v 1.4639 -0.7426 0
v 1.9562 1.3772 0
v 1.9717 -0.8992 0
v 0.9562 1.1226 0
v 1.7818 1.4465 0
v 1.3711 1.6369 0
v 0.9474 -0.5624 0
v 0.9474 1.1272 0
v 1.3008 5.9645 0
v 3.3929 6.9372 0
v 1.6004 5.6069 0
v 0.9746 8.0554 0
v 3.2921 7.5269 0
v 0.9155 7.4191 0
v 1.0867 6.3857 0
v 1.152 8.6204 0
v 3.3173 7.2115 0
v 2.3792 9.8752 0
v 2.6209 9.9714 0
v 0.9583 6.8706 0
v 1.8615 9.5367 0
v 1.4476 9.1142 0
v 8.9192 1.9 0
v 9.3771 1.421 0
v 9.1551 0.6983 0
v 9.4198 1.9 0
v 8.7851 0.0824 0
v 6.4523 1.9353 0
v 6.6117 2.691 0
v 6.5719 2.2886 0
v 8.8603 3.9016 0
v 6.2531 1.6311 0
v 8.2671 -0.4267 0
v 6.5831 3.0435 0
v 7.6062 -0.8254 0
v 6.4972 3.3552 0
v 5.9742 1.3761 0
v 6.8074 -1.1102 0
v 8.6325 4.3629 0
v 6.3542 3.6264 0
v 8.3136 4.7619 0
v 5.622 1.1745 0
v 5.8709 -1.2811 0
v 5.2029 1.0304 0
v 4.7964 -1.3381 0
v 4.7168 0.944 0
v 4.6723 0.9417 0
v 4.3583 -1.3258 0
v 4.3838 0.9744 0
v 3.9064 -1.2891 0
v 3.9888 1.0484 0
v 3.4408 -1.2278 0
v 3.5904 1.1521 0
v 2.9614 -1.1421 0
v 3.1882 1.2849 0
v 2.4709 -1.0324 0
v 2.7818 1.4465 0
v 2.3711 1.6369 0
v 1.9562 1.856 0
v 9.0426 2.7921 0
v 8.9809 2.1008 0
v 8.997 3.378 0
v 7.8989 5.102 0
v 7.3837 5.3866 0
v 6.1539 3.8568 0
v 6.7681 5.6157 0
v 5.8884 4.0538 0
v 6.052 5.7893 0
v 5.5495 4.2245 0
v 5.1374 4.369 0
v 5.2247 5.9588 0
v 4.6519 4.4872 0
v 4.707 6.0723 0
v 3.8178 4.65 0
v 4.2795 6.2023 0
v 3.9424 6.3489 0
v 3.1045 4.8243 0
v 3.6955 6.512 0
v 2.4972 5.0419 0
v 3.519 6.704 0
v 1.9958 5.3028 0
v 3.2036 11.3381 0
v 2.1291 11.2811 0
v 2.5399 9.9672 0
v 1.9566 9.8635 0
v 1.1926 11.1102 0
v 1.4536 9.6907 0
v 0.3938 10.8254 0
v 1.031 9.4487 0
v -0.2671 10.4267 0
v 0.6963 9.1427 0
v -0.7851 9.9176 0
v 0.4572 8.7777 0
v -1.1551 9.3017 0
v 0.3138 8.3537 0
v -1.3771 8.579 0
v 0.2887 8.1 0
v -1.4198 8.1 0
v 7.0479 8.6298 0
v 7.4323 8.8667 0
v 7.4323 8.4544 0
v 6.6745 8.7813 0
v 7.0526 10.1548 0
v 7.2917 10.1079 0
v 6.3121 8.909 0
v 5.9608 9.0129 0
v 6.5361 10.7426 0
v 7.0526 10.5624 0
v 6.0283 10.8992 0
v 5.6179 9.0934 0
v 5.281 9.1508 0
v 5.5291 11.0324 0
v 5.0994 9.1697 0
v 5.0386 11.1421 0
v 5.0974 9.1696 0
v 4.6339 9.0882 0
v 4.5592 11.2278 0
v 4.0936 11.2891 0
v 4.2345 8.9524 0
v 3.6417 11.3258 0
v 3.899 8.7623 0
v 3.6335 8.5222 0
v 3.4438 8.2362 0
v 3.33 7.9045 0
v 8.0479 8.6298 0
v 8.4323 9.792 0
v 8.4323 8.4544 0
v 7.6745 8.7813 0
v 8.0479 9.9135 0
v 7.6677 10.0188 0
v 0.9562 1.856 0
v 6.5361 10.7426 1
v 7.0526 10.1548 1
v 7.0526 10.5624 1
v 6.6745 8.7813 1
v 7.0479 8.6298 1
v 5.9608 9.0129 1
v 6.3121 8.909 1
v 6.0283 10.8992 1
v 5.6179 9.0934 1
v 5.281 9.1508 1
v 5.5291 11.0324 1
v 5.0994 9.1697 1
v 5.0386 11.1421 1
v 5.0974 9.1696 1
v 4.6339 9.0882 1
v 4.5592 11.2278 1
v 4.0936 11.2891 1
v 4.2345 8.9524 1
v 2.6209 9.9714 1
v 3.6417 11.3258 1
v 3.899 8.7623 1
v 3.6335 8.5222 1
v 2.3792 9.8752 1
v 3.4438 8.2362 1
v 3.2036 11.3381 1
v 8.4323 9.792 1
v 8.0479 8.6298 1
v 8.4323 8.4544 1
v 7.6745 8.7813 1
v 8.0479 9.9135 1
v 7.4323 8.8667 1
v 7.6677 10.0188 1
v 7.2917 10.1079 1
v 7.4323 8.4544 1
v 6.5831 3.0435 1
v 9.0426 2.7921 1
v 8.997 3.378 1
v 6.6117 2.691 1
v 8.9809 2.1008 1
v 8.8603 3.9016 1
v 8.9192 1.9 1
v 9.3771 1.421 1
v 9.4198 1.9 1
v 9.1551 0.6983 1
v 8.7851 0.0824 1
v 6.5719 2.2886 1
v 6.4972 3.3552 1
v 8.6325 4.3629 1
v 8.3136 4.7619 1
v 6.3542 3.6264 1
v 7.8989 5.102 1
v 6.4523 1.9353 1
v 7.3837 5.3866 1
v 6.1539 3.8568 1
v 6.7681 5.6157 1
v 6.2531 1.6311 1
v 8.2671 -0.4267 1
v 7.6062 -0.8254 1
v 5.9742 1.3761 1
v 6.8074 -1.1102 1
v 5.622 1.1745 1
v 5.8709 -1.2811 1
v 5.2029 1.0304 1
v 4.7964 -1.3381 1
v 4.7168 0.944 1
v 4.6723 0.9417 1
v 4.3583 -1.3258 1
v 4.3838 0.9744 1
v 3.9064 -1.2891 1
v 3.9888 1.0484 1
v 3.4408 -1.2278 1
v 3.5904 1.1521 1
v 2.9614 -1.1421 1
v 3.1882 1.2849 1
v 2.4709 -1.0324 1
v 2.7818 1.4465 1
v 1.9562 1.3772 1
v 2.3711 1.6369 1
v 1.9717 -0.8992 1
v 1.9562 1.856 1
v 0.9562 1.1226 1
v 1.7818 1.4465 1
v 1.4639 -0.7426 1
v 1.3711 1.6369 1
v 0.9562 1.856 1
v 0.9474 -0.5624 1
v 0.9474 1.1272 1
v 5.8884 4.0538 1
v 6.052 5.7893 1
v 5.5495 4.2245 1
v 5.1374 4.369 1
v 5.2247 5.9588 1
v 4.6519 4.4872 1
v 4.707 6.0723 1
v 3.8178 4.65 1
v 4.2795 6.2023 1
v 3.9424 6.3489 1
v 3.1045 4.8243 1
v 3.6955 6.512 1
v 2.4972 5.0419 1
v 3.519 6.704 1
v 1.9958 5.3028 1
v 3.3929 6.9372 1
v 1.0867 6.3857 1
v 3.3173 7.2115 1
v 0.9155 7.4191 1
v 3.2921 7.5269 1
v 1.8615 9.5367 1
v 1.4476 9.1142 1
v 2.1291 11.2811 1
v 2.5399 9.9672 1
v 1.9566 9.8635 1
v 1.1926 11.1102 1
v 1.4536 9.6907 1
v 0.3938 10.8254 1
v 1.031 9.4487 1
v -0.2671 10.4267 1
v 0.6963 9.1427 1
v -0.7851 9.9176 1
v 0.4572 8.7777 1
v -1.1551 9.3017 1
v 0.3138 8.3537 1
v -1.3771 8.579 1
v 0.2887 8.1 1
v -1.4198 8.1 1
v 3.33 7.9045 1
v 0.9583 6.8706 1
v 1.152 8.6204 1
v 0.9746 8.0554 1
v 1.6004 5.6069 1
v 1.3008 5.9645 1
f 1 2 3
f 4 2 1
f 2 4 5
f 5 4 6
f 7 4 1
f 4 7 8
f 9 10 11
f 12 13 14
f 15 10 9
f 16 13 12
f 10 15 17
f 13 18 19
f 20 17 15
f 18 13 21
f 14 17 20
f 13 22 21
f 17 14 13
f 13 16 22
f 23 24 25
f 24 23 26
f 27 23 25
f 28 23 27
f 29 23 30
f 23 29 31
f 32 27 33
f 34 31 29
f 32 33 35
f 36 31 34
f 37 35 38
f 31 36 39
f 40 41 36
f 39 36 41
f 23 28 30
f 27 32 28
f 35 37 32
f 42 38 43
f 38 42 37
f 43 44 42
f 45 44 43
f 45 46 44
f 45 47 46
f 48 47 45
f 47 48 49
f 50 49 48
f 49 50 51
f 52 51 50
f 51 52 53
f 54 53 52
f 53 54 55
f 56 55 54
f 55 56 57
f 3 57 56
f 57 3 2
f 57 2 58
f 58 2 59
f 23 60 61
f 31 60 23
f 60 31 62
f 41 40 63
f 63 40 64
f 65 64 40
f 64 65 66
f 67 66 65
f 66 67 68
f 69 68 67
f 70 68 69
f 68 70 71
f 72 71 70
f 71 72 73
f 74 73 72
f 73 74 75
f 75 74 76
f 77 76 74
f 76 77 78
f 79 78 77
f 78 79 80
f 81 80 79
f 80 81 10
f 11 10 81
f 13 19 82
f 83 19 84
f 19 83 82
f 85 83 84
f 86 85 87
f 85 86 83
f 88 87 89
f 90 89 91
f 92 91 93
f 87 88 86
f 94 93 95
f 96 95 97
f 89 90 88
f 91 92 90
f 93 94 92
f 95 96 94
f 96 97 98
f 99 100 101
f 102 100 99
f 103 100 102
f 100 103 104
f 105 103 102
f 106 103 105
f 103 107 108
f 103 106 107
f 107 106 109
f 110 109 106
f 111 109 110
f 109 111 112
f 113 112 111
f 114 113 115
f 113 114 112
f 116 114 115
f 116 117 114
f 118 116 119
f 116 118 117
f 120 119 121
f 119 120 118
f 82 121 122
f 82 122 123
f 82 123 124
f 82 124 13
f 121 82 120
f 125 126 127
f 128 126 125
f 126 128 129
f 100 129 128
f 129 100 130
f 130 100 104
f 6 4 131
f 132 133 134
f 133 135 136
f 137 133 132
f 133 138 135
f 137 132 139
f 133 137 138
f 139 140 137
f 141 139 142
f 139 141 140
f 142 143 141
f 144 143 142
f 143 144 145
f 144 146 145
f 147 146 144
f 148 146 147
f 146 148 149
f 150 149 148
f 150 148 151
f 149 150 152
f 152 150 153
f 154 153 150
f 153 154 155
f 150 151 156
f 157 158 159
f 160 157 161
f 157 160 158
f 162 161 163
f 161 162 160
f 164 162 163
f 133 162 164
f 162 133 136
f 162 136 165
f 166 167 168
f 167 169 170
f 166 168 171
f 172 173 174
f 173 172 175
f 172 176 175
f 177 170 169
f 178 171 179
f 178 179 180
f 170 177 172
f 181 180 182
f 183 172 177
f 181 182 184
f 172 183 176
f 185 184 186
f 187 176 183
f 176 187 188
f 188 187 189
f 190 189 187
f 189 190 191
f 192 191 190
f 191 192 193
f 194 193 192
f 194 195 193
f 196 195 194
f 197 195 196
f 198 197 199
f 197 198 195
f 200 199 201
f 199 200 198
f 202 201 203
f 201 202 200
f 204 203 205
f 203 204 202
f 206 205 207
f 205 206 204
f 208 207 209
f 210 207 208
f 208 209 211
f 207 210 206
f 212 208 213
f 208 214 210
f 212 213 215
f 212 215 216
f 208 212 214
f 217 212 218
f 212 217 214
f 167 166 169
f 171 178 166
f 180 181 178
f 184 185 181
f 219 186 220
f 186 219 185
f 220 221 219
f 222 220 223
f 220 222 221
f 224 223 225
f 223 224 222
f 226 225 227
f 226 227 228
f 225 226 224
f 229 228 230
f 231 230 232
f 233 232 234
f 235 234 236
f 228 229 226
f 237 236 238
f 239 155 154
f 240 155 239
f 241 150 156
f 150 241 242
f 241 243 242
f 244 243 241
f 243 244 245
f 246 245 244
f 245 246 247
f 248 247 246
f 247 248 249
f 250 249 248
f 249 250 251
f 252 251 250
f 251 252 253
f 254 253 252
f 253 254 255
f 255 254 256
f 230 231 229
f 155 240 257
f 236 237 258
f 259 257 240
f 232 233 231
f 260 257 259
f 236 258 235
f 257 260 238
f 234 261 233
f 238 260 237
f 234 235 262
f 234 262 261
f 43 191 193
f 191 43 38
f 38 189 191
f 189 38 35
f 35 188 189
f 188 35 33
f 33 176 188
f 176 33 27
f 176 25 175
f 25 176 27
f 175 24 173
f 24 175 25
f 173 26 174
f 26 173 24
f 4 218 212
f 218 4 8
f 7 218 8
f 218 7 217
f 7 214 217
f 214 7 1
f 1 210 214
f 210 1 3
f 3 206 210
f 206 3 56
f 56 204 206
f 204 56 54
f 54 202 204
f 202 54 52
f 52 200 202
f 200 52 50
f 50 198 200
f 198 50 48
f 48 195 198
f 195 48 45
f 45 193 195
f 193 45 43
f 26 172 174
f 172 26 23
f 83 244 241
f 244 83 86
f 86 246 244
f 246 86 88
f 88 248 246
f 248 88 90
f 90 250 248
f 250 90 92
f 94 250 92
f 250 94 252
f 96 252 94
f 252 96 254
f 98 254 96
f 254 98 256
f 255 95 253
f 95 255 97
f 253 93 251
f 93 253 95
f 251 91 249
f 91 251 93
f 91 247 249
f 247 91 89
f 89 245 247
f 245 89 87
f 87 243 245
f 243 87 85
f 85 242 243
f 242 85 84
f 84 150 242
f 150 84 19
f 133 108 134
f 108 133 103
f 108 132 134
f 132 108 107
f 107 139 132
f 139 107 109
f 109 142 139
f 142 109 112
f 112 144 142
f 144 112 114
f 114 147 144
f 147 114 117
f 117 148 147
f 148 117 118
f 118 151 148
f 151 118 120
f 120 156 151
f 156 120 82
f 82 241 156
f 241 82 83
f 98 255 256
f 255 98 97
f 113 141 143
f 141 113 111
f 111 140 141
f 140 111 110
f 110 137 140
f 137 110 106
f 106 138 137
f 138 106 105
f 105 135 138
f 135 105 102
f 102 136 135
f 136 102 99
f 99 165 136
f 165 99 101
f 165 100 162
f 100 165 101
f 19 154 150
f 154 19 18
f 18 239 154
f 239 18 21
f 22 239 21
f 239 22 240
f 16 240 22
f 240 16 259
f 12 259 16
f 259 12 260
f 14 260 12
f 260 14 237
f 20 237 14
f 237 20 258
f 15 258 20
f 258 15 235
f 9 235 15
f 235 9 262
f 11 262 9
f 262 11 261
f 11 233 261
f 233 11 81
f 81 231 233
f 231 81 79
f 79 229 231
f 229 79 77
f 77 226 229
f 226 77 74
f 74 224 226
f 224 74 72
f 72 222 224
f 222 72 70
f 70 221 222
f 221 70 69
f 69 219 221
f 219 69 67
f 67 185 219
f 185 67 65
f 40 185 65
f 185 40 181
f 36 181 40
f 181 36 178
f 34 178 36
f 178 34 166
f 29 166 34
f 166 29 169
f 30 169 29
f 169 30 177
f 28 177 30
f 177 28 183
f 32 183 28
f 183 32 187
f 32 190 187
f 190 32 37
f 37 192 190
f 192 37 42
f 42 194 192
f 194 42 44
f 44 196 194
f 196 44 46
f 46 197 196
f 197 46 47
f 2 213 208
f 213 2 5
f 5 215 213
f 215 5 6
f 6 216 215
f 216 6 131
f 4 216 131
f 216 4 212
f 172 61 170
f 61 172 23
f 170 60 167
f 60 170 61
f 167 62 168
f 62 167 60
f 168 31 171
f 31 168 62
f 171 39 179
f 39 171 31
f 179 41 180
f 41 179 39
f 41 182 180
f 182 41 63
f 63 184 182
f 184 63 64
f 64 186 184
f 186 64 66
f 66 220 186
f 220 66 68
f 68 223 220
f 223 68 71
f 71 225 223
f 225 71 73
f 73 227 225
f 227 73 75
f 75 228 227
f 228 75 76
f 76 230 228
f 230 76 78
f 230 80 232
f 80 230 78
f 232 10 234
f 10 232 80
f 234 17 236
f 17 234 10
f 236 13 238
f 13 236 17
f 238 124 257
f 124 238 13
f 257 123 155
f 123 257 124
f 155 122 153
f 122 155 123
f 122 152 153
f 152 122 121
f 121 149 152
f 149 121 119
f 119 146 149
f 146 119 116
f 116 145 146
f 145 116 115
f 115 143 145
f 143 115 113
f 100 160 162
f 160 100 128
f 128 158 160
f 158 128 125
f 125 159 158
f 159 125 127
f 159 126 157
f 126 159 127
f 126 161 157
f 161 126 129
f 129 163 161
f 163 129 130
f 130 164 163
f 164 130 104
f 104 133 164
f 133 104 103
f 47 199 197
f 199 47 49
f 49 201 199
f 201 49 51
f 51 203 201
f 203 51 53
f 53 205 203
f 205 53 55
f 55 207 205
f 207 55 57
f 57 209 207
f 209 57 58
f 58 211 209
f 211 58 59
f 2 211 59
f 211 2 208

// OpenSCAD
linear_extrude(1)
text("S", font="Iosevka Slab");

linear_extrude(1)
translate([1, 0, 0])
 text("S", font="Iosevka Slab");
 
translate([-0.8,-0.5,0])
scale([1.2,1.2,1])
difference(){
    
    linear_extrude(1)
    translate([0.5, -0.5, 0])
     text("S", font="Iosevka Slab");
    
    translate([0, 2, -5])
    color("#f00")
    cube([10, 10, 10]);
    
}
    
rotate([0, 0, 180])
translate([-8.8,-10.5,0])
scale([1.2,1.2,1])
difference(){
    
    linear_extrude(1)
    translate([0.5, -0.5, 0])
     text("S", font="Iosevka Slab");
    
    translate([0, 2, -5])
    color("#f00")
    cube([10, 10, 10]);
    
}
